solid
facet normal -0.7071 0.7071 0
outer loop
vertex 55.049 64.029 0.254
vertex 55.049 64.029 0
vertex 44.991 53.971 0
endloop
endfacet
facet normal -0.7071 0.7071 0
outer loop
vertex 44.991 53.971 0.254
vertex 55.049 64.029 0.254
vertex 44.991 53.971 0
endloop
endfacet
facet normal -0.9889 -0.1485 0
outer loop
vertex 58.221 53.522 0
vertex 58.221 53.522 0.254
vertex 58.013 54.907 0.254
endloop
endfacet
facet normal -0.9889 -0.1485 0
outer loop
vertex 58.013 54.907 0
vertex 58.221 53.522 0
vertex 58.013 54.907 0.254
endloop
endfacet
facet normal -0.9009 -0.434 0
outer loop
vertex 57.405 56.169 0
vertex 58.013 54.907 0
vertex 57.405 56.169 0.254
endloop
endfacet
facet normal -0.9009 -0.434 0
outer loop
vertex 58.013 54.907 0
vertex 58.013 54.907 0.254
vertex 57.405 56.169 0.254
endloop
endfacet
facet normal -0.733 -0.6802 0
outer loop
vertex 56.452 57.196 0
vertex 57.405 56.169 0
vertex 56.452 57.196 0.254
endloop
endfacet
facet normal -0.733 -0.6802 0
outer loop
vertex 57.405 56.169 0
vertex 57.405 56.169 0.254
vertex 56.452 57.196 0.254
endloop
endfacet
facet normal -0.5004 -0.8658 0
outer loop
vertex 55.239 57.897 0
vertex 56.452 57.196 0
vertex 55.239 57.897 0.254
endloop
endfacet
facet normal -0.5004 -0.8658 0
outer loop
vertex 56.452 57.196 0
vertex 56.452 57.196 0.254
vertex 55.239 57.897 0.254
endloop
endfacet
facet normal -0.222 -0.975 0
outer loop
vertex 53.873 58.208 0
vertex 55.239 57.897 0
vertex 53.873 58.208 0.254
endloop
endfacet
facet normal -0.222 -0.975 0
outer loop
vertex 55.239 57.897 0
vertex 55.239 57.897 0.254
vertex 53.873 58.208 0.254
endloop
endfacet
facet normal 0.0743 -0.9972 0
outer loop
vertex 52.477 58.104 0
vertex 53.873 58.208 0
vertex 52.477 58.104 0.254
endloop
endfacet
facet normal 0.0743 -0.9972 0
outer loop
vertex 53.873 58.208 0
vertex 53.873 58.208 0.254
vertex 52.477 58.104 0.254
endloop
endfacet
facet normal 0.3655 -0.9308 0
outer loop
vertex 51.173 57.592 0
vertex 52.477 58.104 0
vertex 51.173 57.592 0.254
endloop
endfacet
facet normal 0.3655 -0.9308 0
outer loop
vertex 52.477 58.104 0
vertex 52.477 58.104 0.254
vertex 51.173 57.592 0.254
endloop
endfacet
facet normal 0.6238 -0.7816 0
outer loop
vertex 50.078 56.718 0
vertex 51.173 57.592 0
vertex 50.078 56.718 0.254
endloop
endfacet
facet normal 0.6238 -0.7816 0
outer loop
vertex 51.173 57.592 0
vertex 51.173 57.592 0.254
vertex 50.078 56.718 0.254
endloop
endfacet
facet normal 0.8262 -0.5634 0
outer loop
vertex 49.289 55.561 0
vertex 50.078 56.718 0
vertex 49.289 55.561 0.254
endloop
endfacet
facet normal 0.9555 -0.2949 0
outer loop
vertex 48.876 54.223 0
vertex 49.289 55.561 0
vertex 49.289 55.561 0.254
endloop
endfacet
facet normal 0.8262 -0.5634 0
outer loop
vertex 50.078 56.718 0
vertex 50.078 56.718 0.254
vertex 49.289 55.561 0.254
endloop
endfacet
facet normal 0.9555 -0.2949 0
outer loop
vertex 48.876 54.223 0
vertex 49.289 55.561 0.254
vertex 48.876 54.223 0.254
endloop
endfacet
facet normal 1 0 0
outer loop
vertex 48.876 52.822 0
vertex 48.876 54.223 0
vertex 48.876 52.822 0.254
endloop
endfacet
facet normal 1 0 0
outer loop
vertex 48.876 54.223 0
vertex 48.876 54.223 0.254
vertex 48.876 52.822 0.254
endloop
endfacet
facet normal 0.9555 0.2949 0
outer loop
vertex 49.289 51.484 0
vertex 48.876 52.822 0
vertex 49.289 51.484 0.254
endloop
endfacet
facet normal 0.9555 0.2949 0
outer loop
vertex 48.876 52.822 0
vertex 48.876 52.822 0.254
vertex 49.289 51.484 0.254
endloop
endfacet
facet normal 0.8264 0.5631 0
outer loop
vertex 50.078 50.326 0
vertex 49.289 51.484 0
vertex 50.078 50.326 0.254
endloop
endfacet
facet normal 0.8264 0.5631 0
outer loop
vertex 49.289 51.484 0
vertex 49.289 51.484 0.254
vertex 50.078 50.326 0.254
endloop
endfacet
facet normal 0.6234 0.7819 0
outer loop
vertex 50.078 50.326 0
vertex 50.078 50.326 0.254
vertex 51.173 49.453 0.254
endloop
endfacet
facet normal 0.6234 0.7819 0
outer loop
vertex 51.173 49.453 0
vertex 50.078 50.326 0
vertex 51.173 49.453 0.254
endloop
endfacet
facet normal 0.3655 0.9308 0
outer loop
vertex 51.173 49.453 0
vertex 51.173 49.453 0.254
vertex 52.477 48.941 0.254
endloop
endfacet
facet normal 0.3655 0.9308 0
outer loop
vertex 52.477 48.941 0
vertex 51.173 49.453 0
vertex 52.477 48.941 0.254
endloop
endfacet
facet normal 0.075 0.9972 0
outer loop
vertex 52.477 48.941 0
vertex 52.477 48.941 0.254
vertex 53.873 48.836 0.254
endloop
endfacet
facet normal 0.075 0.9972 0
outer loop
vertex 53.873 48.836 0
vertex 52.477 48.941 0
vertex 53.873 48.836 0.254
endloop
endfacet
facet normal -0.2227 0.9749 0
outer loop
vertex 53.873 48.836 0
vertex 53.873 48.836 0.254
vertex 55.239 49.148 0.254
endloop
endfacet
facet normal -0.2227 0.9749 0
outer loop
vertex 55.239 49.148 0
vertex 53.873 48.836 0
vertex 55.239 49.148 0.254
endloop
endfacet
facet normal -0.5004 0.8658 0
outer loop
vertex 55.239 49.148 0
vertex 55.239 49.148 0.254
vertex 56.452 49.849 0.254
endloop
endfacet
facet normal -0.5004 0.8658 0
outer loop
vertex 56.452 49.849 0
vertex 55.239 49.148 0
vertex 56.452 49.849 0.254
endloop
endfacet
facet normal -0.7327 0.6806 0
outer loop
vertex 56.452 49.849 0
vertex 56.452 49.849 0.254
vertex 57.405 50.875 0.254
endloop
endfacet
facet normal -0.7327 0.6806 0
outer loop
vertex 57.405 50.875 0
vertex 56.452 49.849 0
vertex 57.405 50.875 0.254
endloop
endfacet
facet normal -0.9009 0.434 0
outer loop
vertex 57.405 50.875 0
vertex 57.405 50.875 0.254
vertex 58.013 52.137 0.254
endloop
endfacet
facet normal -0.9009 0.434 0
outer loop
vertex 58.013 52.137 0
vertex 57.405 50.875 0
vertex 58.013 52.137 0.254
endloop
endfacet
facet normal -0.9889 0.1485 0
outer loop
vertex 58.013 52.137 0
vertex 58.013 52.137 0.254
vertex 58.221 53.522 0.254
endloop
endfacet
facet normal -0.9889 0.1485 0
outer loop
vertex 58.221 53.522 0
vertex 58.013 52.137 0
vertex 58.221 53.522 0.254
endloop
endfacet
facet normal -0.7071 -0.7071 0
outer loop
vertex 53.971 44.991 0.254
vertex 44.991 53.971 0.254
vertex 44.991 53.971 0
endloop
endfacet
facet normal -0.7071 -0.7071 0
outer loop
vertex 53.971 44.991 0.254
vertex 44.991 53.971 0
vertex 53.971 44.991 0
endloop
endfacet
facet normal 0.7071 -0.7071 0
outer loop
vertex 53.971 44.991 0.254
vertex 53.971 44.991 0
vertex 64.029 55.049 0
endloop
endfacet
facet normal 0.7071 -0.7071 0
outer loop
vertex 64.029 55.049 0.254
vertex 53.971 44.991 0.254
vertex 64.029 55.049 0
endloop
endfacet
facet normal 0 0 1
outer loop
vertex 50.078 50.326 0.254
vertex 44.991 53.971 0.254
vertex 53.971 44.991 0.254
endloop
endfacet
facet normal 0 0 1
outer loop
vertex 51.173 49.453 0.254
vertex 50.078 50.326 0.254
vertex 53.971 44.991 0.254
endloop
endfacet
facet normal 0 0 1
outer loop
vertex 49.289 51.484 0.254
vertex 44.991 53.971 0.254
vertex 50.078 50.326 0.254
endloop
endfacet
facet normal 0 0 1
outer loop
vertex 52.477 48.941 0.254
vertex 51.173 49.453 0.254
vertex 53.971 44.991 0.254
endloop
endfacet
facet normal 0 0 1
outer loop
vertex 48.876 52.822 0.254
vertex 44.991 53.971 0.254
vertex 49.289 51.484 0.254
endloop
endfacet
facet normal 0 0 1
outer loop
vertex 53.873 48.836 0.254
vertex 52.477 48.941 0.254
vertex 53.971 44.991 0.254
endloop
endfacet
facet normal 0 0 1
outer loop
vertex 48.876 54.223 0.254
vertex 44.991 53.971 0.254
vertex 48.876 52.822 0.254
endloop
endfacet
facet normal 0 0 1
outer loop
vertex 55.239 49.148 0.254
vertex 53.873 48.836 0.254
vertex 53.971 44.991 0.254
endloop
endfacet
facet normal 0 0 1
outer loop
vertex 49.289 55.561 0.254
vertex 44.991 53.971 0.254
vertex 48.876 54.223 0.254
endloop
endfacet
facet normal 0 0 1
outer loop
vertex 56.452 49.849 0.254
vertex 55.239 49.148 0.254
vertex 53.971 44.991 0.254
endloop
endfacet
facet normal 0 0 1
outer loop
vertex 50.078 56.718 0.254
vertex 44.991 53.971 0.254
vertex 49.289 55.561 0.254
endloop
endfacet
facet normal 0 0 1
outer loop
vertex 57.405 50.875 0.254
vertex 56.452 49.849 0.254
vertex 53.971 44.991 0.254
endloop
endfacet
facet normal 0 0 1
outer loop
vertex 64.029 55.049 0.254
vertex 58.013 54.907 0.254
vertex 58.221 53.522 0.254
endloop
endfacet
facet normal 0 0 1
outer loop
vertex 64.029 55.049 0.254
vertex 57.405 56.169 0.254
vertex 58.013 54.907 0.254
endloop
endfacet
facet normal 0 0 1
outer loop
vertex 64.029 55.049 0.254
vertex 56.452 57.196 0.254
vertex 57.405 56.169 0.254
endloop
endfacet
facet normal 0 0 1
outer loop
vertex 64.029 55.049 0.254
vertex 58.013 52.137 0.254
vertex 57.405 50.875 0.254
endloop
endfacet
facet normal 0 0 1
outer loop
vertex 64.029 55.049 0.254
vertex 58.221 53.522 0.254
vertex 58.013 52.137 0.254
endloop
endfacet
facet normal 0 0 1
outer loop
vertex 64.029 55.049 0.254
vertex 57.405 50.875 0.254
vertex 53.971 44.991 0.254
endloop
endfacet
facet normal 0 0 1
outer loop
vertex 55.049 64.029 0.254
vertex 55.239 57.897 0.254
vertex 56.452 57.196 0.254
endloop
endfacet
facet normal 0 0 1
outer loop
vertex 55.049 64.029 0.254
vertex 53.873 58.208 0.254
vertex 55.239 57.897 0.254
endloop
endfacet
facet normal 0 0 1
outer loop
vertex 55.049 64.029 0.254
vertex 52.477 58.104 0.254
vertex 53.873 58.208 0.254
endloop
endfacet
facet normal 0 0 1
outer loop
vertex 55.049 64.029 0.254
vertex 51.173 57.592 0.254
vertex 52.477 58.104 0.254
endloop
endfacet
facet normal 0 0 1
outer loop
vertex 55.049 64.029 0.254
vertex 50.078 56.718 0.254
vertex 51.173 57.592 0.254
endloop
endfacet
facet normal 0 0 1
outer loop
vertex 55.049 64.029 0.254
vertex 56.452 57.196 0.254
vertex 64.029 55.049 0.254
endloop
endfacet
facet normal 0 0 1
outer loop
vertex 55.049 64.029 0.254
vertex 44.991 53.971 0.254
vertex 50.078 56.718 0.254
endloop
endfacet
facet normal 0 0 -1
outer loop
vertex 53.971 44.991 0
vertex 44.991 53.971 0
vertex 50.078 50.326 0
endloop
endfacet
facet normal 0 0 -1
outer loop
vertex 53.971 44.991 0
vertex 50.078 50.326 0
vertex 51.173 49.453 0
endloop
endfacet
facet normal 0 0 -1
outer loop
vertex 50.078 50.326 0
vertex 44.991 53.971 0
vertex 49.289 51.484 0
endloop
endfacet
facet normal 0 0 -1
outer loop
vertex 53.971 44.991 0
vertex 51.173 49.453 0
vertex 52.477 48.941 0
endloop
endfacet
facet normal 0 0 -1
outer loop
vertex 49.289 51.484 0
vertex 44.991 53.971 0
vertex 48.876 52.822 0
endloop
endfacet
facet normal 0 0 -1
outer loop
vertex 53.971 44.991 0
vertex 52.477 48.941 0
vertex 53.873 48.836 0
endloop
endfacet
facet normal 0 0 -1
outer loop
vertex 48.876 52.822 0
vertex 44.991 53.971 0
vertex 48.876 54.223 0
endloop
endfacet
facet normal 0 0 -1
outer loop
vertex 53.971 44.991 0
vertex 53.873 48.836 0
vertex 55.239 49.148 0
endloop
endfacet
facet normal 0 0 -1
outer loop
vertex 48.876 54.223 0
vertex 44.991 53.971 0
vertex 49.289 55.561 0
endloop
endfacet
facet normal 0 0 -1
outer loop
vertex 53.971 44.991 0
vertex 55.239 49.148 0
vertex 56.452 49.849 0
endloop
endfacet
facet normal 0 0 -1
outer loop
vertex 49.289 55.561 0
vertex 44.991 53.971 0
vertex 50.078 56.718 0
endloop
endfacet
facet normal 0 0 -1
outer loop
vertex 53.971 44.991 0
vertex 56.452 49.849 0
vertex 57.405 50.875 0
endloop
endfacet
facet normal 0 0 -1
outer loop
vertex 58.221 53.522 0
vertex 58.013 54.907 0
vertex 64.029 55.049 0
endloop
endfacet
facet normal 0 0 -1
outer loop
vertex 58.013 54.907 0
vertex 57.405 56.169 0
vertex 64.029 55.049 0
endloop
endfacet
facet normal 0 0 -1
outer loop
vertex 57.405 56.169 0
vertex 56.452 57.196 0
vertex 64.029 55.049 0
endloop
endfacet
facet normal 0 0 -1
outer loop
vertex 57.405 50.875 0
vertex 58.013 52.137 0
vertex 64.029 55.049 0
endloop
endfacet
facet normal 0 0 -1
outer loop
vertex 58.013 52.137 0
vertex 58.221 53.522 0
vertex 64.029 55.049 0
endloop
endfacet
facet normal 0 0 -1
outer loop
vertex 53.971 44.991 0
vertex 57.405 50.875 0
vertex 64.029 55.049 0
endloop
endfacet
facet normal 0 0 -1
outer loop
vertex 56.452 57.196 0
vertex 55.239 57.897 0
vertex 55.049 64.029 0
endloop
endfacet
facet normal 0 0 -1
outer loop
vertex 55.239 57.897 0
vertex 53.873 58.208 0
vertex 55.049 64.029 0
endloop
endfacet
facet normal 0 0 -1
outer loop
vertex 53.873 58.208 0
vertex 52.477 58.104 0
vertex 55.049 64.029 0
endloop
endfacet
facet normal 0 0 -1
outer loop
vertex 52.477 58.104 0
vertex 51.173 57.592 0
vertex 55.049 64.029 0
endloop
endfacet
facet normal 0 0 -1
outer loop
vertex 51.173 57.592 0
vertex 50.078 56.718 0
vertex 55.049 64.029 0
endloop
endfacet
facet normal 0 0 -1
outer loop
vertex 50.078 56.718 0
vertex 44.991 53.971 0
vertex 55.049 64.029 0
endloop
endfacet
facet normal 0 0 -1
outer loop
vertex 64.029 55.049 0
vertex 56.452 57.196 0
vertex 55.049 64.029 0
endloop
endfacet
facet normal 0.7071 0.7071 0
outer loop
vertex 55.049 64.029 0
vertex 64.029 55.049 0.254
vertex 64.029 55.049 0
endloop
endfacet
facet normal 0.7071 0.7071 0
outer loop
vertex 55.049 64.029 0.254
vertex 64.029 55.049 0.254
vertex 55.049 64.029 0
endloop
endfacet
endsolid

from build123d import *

# Parameters (mm, degrees)
BOSS_EXTRUDE1_DEPTH = 0.254
SKETCH2_R           = 4.699
CUT_EXTRUDE1_DEPTH  = 1.254
SKETCH3_W           = 2.54
SKETCH3_H           = 0.635
CUT_EXTRUDE2_DEPTH  = 1.254
SKETCH5_OUTSIDE_W   = 121.447
SKETCH5_OUTSIDE_H   = 109.618
CUT_EXTRUDE5_DEPTH  = 1.254


with BuildPart() as part:
    # Sketch1 → Boss-Extrude1 (new body)
    with BuildSketch(Plane.XY):
        with BuildLine():
            Line((67.21146711, 76.191723231), (8.696654013, 17.676910134))
            Line((8.696654013, 17.676910134), (7.228954972, 14.133571205))
            ThreePointArc((7.228954972, 14.133571205), (14.666587579, 6.075099489), (15.105587123, -4.88230096))
            Line((15.105587123, -4.88230096), (18.648926052, -6.35))
            Line((18.648926052, -6.35), (101.401368334, -6.35))
            ThreePointArc((101.401368334, -6.35), (93.866160503, 38.880636728), (67.21146711, 76.191723231))
        make_face()
        with BuildLine():
            Line((88.672924278, 6.35), (27.86051193, 6.35))
            ThreePointArc((27.86051193, 6.35), (26.399857642, 10.93517908), (24.190484974, 15.210228852))
            Line((24.190484974, 15.210228852), (67.191354125, 58.211098004))
            ThreePointArc((67.191354125, 58.211098004), (82.13289044, 34.020557137), (88.672924278, 6.35))
        make_face(mode=Mode.SUBTRACT)
    extrude(amount=BOSS_EXTRUDE1_DEPTH)

    # Sketch2 → Cut-Extrude1 (cut, through all)
    with BuildSketch(Plane.XY.offset(0.254)):
        with Locations((22.225, 0)):
            Circle(SKETCH2_R)
        with Locations((36.195, 0)):
            Circle(SKETCH2_R)
        with Locations((61.722, 0)):
            Circle(SKETCH2_R)
        with Locations((75.692, 0)):
            Circle(SKETCH2_R)
        with Locations((95.25, 0)):
            Circle(SKETCH2_R)
        with Locations((15.715448212, 15.715448212)):
            Circle(SKETCH2_R)
        with Locations((25.593729945, 25.593729945)):
            Circle(SKETCH2_R)
        with Locations((43.644044748, 43.644044748)):
            Circle(SKETCH2_R)
        with Locations((53.522326482, 53.522326482)):
            Circle(SKETCH2_R)
        with Locations((92.004434954, 24.652514046)):
            Circle(SKETCH2_R)
        with Locations((82.48891971, 47.625)):
            Circle(SKETCH2_R)
        with Locations((67.351920908, 67.351920908)):
            Circle(SKETCH2_R)
    extrude(amount=-CUT_EXTRUDE1_DEPTH, mode=Mode.SUBTRACT)

    # Sketch3 → Cut-Extrude2 (cut, through all)
    with BuildSketch(Plane.XY.offset(0.254)):
        Polygon((15.266435406, 24.246691527), (17.06248663, 26.042742751), (17.511499436, 25.593729945), (15.715448212, 23.797678721), align=None)
        Polygon((44.991083167, 53.971339288), (43.195031942, 52.175288063), (43.644044748, 51.726275257), (45.440095973, 53.522326482), align=None)
        with Locations((29.21, -6.0325)):
            Rectangle(SKETCH3_W, SKETCH3_H)
        with Locations((68.707, -6.0325)):
            Rectangle(SKETCH3_W, SKETCH3_H)
        Polygon((29.230733674, 38.210989795), (31.026784898, 40.007041019), (31.475797704, 39.558028213), (29.67974648, 37.761976989), align=None)
        Polygon((56.845021246, 65.825277367), (55.048970022, 64.029226143), (55.497982828, 63.580213337), (57.294034052, 65.376264561), align=None)
        with Locations((48.9585, -6.0325)):
            Rectangle(SKETCH3_W, SKETCH3_H)
        with Locations((85.471, -6.0325)):
            Rectangle(SKETCH3_W, SKETCH3_H)
        Polygon((99.935462164, 14.437711971), (100.266998693, 11.919442024), (101.526133667, 12.085210288), (101.194597138, 14.603480236), align=None)
        Polygon((93.765504959, 37.464305742), (94.938831965, 37.950313702), (93.966816047, 40.296967714), (92.793489041, 39.810959755), align=None)
        Polygon((79.327792988, 62.471156422), (80.874047017, 60.456038938), (81.88160576, 61.229165953), (80.33535173, 63.244283437), align=None)
        Polygon((13.593916116, 7.005422516), (14.565932035, 4.658768503), (15.739259041, 5.144776462), (14.767243123, 7.491430475), align=None)
    extrude(amount=-CUT_EXTRUDE2_DEPTH, mode=Mode.SUBTRACT)

    # Sketch5 outside → Cut-Extrude5 (cut, through all)
    with BuildSketch(Plane.XY.offset(0.254)):
        with Locations((54.4145, 34.921)):
            Rectangle(SKETCH5_OUTSIDE_W, SKETCH5_OUTSIDE_H)
        Polygon((53.971339288, 44.991083167), (64.029226143, 55.048970022), (55.048970022, 64.029226143), (44.991083167, 53.971339288), align=None, mode=Mode.SUBTRACT)
    extrude(amount=-CUT_EXTRUDE5_DEPTH, mode=Mode.SUBTRACT)


solid = part.part
